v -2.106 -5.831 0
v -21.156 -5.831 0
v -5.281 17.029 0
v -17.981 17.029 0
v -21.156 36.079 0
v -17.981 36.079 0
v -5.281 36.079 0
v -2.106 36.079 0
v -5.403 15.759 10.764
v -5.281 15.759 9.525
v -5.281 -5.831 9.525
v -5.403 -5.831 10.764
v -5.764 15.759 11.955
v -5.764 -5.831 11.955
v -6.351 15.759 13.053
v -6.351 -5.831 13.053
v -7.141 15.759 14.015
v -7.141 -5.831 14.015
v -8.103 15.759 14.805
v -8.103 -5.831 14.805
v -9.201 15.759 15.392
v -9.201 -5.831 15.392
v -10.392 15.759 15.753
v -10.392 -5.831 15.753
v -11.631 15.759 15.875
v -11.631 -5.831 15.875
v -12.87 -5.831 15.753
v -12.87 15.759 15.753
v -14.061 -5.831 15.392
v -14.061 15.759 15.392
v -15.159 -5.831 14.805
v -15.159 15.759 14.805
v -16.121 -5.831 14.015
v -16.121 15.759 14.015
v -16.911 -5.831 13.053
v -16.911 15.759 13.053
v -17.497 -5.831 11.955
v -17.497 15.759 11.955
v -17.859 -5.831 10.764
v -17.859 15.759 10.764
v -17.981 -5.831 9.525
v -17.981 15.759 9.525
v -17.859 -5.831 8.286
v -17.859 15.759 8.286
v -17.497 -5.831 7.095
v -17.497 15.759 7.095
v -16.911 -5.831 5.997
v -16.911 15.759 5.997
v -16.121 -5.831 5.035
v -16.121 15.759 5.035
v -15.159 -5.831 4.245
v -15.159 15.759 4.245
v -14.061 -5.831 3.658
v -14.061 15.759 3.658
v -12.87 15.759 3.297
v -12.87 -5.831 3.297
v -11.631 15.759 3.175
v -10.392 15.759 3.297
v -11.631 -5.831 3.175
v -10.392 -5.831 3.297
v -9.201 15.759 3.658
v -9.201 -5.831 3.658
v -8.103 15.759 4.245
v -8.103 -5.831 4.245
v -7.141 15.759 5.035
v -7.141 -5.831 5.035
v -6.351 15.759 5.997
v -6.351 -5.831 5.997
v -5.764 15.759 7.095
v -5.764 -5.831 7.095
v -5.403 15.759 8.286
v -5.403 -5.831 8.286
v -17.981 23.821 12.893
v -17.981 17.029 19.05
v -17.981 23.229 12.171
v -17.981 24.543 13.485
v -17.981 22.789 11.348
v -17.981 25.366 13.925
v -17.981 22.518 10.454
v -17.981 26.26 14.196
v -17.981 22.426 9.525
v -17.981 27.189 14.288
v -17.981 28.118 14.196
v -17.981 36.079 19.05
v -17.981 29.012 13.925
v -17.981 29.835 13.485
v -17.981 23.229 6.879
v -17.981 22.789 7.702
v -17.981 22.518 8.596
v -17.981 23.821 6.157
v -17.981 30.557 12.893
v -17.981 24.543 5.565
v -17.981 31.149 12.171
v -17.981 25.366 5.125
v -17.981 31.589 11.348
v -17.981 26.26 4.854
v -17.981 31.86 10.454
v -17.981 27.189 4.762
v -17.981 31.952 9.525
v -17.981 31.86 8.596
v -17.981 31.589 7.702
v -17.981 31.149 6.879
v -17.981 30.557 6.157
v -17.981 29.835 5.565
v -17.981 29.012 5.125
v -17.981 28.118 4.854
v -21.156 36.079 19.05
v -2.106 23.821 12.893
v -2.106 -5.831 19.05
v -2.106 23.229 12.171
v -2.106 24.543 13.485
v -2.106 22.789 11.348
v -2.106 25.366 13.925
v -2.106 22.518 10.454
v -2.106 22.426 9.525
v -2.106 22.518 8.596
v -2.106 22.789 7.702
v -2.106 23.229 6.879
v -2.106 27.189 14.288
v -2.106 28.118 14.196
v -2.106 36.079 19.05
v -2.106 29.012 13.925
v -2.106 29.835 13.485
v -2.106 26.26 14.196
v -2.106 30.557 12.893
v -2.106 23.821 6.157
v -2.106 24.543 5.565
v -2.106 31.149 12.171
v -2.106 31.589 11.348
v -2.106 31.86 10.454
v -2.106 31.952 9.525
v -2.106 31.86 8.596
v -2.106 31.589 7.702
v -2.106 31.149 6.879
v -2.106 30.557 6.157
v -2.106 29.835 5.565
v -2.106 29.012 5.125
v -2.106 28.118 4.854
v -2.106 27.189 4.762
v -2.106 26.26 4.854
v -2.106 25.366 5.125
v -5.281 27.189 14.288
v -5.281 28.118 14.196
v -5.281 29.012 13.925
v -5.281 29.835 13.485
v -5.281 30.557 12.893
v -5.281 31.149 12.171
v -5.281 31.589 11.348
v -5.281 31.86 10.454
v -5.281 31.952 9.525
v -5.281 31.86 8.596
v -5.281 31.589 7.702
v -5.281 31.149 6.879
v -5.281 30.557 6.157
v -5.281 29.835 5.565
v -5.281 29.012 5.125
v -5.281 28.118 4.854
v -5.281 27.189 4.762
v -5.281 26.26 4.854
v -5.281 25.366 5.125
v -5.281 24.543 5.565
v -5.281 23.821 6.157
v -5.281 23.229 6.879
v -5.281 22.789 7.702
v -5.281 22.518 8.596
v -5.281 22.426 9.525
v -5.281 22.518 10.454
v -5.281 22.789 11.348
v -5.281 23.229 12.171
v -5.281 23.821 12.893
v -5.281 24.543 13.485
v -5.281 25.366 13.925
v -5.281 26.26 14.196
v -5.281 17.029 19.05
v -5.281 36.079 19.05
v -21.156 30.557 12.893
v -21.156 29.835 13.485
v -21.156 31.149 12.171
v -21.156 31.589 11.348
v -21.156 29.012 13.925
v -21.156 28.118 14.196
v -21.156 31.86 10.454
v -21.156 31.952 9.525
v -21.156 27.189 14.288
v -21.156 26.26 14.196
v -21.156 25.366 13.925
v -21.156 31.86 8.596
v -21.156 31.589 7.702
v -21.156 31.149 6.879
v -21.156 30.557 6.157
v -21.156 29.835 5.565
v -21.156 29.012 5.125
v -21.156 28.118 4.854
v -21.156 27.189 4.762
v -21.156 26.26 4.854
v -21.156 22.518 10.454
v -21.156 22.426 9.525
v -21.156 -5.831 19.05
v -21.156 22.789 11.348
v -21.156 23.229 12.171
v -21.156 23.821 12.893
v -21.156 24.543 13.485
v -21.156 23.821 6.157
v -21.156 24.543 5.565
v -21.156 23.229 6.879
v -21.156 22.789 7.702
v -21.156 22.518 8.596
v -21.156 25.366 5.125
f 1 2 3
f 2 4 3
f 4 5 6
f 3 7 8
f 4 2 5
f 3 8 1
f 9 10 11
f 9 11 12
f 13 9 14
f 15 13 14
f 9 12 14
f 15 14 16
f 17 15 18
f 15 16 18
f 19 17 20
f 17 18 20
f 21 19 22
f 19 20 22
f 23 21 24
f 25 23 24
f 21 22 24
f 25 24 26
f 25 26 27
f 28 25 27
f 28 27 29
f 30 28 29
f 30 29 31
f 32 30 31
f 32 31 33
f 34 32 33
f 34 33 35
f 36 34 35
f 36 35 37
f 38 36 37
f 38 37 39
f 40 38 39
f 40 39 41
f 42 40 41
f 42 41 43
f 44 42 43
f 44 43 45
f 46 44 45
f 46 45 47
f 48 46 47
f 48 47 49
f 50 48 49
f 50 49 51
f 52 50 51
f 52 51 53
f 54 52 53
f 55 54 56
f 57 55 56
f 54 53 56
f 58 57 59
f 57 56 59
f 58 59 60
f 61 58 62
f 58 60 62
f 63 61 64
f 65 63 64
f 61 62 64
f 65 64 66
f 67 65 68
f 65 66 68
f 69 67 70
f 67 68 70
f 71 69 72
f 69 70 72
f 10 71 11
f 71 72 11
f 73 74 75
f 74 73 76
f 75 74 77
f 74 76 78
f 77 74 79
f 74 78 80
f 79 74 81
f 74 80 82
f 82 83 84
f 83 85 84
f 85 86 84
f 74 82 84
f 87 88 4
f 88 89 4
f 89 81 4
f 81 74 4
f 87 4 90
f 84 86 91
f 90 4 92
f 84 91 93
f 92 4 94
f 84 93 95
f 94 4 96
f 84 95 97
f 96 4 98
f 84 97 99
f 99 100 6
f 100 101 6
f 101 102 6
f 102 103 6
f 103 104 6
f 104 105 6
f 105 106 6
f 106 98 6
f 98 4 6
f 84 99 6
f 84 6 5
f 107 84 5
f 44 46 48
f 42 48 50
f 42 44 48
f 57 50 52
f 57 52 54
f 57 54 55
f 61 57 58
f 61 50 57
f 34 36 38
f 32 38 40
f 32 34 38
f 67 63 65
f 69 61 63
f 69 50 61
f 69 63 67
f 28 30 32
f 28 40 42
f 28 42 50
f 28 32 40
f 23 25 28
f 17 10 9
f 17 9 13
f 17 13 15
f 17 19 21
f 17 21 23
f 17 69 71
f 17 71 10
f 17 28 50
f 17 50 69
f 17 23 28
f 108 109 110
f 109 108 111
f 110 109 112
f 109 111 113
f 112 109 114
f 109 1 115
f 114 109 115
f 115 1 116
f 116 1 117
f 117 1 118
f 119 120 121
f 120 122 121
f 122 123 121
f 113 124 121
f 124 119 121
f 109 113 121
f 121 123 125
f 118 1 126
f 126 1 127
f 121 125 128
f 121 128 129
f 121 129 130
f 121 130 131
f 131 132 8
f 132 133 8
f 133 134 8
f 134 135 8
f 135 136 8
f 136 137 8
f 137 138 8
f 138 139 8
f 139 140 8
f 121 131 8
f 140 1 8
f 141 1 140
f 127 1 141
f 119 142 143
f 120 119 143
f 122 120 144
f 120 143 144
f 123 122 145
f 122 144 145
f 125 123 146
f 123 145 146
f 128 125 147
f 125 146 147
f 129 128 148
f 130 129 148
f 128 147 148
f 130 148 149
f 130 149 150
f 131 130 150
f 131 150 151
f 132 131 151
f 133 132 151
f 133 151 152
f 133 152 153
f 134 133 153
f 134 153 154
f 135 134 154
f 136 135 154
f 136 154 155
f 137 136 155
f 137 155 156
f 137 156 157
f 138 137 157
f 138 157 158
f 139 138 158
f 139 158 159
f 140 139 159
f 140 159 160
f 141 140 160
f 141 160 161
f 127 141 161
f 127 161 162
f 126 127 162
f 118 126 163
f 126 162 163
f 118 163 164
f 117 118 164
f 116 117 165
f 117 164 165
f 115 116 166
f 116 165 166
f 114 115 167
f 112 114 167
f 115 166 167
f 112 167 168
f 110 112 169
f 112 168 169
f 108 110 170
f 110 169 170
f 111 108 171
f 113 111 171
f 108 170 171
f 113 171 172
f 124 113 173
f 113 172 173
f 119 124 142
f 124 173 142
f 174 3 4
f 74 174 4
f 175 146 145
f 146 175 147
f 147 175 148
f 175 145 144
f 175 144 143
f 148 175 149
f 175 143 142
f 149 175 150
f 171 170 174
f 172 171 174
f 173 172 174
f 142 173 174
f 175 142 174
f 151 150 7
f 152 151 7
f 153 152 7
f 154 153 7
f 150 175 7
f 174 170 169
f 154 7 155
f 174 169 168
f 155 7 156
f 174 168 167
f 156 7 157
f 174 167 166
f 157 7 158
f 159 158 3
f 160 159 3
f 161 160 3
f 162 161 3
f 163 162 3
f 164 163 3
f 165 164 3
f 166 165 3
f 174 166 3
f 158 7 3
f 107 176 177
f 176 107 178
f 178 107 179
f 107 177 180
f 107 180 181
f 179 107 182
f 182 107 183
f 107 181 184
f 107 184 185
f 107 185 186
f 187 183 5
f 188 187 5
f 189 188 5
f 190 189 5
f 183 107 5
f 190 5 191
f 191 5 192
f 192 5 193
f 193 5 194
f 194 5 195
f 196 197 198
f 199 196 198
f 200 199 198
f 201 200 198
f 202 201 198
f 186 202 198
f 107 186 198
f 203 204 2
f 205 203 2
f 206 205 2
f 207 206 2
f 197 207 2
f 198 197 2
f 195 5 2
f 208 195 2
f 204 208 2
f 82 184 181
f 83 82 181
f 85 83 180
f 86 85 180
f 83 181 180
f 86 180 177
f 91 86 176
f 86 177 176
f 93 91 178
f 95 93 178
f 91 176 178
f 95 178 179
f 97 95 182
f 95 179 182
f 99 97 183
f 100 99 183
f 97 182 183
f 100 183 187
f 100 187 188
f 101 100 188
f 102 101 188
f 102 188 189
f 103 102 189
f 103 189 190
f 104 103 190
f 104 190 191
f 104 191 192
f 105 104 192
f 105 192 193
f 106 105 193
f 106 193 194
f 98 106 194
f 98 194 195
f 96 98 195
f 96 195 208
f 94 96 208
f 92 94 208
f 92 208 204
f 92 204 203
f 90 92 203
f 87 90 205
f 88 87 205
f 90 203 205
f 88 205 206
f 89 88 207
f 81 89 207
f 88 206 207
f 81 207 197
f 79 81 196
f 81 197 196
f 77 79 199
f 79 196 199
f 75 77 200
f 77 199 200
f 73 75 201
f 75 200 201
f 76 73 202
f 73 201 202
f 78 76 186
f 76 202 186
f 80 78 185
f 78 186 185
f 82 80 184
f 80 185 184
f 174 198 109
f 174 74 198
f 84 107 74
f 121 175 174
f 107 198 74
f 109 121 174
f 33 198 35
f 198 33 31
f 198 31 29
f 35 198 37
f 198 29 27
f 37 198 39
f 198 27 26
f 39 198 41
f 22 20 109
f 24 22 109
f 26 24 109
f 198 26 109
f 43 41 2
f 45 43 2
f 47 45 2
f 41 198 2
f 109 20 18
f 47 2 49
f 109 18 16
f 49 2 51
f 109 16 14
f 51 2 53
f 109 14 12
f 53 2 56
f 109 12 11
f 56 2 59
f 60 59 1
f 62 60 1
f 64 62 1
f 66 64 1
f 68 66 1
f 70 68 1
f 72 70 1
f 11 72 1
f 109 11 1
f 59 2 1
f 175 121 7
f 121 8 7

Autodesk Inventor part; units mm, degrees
ref_plane "YZ Plane" through (0, 0, 0) normal (1, 0, 0) x (0, 1, 0)
ref_plane "XZ Plane" through (0, 0, 0) normal (0, 1, 0) x (-1, 0, 0)
ref_plane "XY Plane" through (0, 0, 0) normal (0, 0, 1) x (1, 0, 0)
sketch "Sketch1" plane through (0, 0, 0) normal (0, 0, 1) x (1, 0, 0)
  line L0 (-21.1557, 36.079) -> (-21.1557, -5.831)
  line L1 (-21.1557, -5.831) -> (-2.1057, -5.831)
  line L2 (-2.1057, -5.831) -> (-2.1057, 36.079)
  line L3 (-2.1057, 36.079) -> (-5.2807, 36.079)
  line L4 (-5.2807, 36.079) -> (-5.2807, 17.029)
  line L5 (-5.2807, 17.029) -> (-17.9807, 17.029)
  line L6 (-17.9807, 17.029) -> (-17.9807, 36.079)
  line L7 (-17.9807, 36.079) -> (-21.1557, 36.079)
  point P0 (0, 0)
  dimension "d0" = 19.05
  dimension "d1" = 12.7
  dimension "d2" = 3.175
  dimension "d3" = 3.175
  dimension "d4" = 41.91
  dimension "d5" = 19.05
  dimension "d6" = 0
extrude "Extrusion1" add sketch "Sketch1" along normal blind 19.05
sketch "Sketch2" plane through (-21.1557, -5.831, 0) normal (0, -1, 0) x (1, 0, 0)
  circle A0 centre (9.525, 9.525) radius 6.35
  point P0 (21.1557, 0)
  dimension "d9" = 12.7
extrude "Extrusion2" cut sketch "Sketch2" against normal blind 21.59
sketch "Sketch3" plane through (-21.1557, -5.831, 0) normal (-1, 0, 0) x (0, 0, 1)
  line L0 (0, 41.91) -> (19.05, 41.91) projected
  circle A0 centre (9.525, 33.02) radius 4.7625
  point P0 (0, 5.831)
  dimension "d12" = 9.525
  dimension "d13" = 8.89
extrude "Extrusion3" cut sketch "Sketch3" against normal through all
thread "Thread1" size "1/2-13 UNC" class "2B" standard "ANSI Unified Screw Threads" full length
properties part number "1in Actuator Clovis 1764"
